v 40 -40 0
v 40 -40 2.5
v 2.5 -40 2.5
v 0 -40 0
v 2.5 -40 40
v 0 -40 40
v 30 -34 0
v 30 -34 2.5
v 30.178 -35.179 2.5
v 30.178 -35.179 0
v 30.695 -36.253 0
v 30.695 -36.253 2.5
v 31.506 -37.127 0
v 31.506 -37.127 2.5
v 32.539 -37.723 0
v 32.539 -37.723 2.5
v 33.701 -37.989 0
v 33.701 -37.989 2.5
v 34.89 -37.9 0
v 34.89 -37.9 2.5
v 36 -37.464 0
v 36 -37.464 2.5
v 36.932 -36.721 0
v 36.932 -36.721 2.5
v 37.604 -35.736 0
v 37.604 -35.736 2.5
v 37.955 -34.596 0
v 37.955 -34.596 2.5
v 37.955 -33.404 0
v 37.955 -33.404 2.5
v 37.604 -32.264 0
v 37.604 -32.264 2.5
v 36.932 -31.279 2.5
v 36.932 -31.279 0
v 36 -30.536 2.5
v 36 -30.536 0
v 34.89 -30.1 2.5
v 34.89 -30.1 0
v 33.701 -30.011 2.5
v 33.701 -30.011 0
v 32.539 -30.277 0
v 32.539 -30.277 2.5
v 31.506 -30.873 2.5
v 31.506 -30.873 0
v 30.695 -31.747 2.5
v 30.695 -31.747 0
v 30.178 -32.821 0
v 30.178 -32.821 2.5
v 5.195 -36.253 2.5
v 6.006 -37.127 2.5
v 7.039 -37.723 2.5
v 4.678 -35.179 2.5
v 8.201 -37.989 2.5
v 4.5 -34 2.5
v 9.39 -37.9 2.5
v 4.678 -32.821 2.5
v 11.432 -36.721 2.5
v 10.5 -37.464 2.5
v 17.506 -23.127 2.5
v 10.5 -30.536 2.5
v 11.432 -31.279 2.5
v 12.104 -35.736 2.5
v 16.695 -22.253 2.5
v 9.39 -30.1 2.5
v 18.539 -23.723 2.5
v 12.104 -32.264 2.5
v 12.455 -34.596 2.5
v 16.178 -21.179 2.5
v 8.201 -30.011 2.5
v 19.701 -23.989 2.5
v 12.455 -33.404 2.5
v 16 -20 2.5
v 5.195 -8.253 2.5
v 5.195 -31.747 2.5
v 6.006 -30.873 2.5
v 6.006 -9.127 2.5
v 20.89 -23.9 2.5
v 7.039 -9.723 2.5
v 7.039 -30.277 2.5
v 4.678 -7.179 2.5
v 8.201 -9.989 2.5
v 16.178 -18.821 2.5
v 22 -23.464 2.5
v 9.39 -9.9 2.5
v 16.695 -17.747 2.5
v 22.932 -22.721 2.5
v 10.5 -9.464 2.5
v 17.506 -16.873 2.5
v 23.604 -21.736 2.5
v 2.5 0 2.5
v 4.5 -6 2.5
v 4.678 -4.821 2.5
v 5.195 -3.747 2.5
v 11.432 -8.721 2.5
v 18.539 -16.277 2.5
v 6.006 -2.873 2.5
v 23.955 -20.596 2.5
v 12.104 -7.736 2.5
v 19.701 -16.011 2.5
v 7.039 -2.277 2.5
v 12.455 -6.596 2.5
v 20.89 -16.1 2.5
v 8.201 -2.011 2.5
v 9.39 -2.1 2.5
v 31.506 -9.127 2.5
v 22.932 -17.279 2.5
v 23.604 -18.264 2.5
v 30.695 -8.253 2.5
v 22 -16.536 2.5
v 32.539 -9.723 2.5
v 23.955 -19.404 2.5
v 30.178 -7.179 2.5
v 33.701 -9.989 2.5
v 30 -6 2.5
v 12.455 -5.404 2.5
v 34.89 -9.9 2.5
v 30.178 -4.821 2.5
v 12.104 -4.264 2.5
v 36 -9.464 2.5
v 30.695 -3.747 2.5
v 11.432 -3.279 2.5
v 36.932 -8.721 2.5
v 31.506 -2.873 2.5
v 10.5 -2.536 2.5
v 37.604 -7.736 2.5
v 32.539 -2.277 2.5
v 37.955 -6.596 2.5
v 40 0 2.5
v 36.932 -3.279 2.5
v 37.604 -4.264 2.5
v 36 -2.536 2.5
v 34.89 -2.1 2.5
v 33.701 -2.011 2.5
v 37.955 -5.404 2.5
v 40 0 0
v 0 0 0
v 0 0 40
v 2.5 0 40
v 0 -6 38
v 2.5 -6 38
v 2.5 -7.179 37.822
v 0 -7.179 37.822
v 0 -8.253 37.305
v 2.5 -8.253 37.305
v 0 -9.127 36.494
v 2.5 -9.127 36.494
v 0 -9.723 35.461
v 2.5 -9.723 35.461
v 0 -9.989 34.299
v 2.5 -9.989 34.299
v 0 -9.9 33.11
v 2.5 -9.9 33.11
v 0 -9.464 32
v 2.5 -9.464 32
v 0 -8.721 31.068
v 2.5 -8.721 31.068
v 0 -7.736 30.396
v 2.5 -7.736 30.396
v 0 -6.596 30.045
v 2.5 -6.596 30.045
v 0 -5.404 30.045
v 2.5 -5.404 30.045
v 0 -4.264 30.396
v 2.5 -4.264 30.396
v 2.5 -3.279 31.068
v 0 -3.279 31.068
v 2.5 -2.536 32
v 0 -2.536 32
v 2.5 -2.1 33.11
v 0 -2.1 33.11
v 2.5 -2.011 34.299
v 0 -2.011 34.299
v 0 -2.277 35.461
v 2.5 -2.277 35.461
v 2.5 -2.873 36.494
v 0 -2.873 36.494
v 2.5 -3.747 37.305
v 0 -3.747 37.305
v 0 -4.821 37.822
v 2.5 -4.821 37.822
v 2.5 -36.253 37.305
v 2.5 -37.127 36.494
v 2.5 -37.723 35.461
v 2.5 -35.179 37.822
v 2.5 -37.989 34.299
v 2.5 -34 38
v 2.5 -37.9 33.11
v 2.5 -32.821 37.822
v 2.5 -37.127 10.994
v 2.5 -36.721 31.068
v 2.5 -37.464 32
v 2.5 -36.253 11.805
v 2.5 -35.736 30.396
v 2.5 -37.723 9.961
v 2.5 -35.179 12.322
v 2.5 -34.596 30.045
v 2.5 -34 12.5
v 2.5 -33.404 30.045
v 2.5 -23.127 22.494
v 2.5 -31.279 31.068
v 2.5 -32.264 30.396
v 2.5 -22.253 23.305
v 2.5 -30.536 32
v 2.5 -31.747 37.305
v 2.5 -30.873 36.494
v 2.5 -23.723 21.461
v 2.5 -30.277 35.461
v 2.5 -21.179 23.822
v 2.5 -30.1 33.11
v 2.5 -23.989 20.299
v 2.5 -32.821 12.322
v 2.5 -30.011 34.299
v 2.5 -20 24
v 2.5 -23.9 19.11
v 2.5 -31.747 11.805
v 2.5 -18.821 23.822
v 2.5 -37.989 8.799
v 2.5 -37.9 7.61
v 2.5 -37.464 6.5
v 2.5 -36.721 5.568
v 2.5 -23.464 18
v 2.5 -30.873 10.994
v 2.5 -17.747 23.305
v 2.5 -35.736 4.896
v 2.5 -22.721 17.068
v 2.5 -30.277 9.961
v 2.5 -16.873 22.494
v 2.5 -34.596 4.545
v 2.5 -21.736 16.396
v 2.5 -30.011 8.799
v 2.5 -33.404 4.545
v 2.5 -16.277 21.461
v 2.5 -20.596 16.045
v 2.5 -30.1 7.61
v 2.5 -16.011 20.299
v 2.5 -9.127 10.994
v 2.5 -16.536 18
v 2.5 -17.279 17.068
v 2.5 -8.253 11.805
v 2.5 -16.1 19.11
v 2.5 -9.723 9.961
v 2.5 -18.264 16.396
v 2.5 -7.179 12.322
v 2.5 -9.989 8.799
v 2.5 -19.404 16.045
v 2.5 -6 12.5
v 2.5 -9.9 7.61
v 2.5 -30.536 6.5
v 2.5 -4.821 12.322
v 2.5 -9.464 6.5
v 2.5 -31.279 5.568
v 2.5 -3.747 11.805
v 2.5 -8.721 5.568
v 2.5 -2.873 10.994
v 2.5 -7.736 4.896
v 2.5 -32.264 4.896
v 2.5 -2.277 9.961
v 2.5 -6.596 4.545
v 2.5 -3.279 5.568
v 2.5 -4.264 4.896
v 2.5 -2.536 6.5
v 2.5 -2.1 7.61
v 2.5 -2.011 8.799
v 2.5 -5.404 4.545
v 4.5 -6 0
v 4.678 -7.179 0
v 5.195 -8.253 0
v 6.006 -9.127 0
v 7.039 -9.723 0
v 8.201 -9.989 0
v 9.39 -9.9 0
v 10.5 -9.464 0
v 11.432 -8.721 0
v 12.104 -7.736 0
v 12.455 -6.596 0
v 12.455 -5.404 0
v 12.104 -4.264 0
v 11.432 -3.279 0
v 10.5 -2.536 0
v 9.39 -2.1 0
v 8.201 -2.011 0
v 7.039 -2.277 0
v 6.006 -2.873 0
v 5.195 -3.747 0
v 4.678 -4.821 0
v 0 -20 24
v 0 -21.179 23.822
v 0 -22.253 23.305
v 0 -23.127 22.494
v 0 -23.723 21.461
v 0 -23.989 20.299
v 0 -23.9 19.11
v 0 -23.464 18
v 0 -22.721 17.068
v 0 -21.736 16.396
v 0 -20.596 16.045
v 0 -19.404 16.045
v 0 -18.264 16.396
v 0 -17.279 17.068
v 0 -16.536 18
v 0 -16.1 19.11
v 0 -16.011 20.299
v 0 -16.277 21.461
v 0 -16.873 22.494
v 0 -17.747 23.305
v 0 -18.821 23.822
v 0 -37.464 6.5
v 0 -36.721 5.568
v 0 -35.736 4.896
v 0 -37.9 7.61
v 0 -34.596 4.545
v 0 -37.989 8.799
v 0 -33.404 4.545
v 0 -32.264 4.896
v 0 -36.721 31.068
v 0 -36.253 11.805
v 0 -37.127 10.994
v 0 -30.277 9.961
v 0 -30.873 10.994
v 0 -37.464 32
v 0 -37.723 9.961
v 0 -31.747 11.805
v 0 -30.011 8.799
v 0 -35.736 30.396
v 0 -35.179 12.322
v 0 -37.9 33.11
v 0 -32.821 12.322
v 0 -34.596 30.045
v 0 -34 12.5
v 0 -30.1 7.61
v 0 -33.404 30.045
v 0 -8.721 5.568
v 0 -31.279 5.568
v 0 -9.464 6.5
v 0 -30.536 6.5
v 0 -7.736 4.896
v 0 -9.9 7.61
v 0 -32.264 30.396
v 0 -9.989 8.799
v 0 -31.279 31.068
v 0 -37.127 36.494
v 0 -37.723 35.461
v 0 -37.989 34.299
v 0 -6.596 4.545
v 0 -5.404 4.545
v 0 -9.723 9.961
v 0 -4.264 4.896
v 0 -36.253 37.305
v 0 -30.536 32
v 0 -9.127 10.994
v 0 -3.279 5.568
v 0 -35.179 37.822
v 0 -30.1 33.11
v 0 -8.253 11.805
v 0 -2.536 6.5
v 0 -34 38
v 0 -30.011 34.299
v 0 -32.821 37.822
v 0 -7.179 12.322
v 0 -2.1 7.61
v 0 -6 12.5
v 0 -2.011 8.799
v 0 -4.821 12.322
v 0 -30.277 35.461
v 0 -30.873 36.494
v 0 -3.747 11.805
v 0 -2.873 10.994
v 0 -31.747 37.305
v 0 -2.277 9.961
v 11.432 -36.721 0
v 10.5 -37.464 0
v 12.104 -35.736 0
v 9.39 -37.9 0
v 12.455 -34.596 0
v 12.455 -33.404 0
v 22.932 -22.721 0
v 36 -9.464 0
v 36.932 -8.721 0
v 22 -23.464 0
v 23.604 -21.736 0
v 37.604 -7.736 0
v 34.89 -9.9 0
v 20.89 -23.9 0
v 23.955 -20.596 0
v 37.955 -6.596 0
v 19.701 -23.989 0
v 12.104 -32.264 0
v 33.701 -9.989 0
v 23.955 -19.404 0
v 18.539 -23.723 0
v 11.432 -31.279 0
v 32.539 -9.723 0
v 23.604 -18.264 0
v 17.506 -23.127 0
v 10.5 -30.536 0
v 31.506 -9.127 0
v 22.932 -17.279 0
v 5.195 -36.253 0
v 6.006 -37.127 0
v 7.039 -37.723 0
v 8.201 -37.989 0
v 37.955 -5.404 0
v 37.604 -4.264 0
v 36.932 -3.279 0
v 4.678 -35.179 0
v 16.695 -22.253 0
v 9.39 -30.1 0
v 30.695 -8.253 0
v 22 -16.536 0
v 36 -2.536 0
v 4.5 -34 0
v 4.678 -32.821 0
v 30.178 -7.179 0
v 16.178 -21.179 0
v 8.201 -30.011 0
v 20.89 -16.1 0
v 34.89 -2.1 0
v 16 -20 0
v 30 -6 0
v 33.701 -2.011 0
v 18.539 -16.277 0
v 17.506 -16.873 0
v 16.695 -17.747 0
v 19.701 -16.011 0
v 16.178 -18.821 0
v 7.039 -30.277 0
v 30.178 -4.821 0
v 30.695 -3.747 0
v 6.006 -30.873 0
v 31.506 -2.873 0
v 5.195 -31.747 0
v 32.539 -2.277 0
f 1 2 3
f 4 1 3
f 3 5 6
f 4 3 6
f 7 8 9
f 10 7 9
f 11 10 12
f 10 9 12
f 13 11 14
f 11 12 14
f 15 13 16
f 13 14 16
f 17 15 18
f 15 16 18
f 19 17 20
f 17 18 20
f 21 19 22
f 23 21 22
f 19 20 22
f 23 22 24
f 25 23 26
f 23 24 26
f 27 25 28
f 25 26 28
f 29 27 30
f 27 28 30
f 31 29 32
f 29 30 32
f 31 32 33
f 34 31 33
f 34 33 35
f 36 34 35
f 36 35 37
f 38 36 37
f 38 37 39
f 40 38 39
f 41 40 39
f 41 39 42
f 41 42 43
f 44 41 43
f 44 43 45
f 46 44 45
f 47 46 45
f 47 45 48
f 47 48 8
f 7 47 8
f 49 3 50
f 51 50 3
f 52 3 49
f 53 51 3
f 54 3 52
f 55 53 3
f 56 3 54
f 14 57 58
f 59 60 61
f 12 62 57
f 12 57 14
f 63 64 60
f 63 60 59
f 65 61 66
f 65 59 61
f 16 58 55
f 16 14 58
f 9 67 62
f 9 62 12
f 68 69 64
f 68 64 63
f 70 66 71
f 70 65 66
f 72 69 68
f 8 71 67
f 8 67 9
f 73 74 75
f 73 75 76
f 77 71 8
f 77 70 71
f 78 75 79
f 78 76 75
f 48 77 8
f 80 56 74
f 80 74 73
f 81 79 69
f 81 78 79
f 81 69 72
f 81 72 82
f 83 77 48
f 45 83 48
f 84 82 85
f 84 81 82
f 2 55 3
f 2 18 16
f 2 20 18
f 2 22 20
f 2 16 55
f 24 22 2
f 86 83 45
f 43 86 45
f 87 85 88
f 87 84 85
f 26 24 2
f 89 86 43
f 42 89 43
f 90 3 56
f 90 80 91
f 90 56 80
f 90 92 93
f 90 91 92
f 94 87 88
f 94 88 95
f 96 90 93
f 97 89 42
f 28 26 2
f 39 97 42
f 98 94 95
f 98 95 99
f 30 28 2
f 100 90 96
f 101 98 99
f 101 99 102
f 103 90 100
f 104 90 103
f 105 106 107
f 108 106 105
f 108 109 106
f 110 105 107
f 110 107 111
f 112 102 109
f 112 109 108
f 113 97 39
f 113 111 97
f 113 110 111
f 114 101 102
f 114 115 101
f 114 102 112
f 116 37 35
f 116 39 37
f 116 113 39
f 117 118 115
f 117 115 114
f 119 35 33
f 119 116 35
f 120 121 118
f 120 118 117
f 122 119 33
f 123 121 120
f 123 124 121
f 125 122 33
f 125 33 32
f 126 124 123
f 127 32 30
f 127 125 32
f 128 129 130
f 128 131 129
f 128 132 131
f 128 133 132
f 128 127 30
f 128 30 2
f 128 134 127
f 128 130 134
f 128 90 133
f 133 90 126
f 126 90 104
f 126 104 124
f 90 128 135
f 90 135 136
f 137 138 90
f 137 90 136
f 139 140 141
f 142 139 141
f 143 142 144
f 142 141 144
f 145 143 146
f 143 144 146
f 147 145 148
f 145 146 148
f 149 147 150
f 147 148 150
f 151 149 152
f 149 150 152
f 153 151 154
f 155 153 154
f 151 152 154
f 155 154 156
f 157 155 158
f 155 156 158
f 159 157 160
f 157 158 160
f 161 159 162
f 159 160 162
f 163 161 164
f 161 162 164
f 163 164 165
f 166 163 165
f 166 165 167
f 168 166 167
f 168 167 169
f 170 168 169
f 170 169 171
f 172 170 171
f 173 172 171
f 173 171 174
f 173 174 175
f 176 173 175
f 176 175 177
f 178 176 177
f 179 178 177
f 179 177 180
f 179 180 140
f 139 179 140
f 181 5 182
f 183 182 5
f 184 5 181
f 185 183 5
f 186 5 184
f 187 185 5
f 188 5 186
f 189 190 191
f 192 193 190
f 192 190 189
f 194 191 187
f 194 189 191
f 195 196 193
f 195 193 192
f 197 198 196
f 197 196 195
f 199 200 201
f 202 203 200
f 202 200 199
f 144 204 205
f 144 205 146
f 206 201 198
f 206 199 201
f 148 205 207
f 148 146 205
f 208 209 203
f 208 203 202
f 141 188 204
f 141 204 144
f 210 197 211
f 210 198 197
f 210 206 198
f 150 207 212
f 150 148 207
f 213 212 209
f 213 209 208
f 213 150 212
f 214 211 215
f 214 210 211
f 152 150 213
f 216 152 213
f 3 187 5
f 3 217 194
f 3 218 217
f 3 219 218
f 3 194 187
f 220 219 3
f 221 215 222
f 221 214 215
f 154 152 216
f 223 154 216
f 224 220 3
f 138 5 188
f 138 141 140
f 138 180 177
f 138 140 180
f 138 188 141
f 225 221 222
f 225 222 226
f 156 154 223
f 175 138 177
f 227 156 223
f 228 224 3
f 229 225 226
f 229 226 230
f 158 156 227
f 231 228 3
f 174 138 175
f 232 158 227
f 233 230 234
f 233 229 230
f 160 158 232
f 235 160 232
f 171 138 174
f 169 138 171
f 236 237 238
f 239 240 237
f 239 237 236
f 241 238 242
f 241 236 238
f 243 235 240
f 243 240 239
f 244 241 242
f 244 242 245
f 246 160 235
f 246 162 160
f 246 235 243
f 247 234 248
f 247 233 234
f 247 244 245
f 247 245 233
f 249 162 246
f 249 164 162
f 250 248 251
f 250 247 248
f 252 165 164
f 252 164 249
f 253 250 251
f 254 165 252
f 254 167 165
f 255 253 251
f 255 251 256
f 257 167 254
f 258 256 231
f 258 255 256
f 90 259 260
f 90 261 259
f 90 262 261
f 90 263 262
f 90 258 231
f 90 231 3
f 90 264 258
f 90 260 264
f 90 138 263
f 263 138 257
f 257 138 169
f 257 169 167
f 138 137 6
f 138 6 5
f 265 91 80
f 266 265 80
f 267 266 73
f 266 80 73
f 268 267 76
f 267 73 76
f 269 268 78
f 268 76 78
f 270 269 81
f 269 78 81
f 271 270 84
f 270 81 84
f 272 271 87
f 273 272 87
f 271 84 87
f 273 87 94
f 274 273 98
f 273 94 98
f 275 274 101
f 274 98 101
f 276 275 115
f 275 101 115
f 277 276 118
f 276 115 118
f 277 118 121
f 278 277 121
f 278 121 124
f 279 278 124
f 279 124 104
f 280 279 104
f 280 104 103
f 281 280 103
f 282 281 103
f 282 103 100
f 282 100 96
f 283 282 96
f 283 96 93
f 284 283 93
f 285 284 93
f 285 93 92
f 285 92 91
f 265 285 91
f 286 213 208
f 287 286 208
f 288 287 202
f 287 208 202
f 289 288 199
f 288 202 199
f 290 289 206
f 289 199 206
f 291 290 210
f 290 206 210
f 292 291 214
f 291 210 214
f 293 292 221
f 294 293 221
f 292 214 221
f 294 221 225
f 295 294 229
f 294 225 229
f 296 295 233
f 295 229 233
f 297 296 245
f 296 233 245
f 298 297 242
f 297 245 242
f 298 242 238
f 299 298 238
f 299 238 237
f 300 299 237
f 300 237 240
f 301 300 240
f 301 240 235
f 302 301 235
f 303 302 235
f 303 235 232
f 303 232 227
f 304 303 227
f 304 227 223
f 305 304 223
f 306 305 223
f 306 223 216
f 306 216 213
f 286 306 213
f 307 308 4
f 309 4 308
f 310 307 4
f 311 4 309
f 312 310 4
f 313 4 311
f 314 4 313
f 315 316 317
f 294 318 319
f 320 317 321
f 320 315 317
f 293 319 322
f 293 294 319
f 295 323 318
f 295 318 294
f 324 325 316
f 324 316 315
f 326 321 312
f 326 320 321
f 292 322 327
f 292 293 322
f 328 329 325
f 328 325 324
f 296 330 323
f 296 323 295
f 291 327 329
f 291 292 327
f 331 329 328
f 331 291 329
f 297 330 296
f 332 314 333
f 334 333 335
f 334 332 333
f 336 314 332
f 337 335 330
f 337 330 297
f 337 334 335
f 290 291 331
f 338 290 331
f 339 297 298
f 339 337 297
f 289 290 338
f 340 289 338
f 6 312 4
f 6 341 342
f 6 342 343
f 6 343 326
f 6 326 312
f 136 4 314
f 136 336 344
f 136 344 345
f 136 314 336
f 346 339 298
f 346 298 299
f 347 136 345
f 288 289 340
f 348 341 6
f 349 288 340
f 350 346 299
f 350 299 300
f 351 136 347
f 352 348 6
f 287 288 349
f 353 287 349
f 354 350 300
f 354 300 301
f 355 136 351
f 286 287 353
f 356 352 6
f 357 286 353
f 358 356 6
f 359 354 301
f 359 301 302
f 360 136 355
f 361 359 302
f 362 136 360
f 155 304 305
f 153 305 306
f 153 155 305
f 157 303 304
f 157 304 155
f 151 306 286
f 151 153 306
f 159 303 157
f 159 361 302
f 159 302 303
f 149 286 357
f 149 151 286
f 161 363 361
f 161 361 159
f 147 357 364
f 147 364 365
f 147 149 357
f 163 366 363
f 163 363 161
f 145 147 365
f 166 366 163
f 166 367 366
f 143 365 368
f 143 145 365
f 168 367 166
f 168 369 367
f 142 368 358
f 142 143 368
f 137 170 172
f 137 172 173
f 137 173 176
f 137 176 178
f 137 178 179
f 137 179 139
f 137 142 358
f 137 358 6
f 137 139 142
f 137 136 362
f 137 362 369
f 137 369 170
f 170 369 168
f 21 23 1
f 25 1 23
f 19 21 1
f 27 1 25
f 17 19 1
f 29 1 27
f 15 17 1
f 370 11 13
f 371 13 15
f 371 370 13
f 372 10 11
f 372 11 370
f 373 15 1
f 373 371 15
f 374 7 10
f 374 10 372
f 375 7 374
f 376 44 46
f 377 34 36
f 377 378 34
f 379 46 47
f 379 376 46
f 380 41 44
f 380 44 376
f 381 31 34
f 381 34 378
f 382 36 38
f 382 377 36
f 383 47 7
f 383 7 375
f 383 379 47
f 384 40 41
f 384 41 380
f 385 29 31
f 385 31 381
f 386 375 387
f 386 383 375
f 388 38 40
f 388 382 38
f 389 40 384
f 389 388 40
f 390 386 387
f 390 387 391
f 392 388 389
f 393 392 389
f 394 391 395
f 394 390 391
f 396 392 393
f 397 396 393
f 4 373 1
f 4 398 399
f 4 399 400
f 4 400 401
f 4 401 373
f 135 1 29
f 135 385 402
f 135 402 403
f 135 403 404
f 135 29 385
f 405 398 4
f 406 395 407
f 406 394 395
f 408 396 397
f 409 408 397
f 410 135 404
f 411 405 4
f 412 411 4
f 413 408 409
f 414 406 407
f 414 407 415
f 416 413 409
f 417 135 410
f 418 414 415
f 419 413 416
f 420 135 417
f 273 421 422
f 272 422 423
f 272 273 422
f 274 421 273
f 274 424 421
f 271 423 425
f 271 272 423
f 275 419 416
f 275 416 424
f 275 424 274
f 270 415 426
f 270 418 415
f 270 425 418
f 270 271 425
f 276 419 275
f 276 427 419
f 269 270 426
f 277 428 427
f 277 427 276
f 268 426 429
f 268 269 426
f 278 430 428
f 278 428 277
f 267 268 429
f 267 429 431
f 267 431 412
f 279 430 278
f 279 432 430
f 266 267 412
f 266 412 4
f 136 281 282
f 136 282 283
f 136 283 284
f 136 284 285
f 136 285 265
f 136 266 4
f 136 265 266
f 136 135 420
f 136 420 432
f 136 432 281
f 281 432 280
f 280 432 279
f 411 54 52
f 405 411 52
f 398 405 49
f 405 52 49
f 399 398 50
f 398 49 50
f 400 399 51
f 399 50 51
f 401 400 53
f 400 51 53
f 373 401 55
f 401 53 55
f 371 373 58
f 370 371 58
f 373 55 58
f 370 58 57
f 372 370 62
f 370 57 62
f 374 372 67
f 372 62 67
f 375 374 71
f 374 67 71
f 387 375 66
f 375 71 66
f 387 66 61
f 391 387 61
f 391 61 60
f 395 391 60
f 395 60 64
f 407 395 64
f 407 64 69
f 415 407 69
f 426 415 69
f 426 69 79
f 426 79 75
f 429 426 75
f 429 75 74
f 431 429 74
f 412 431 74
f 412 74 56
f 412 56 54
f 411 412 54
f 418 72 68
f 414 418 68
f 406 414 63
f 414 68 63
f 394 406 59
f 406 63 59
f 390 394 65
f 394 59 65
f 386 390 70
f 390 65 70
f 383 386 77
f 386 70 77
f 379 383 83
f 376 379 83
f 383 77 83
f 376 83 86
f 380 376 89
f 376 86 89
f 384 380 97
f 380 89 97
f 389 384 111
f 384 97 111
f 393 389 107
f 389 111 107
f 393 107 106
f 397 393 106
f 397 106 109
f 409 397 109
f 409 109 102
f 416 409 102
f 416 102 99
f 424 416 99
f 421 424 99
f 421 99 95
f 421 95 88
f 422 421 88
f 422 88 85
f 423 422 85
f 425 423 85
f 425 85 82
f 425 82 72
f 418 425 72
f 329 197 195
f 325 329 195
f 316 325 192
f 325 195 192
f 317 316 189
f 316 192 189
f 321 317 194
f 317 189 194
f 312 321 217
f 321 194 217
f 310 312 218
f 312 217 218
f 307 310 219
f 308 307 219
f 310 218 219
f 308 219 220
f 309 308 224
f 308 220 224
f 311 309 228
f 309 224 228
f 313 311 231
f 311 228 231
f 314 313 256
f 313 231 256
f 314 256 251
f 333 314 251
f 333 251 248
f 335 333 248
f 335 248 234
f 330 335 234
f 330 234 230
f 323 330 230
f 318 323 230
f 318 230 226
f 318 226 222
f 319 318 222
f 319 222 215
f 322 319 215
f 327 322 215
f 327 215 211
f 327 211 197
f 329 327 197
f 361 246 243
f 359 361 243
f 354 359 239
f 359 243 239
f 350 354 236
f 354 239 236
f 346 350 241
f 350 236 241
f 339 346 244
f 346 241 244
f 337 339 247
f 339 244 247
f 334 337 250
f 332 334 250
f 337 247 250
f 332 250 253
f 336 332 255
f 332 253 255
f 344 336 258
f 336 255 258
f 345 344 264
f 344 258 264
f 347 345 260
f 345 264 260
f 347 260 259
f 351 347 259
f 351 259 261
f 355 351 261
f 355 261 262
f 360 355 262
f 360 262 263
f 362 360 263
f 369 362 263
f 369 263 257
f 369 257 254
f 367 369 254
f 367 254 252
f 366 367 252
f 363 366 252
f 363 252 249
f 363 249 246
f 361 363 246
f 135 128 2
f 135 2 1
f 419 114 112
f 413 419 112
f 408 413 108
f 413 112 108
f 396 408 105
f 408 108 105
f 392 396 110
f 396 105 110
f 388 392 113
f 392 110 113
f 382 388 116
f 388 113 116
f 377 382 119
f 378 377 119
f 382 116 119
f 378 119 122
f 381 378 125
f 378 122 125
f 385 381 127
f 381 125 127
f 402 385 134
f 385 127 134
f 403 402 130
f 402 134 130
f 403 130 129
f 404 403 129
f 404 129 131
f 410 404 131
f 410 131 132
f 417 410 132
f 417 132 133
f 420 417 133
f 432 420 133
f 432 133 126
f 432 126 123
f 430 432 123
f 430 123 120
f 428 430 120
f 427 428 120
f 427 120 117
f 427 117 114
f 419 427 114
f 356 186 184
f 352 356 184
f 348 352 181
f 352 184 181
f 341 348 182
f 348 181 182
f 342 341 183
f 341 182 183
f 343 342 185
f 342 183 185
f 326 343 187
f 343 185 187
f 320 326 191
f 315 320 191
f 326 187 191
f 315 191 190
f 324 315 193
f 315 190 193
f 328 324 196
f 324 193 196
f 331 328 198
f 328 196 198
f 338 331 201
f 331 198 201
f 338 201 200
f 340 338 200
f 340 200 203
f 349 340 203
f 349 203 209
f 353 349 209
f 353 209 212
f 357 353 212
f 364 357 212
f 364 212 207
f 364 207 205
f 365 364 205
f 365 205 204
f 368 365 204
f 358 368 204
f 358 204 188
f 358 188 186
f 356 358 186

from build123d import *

# Parameters (mm, degrees)
PAD_DEPTH       = 40
SKETCH001_R     = 4
POCKET_DEPTH    = 2.501
SKETCH002_R     = 4
POCKET001_DEPTH = 2.501


with BuildPart() as part:
    # Sketch → Pad (new body)
    with BuildSketch(Plane.XZ):
        Polygon((0, 0), (0, 40), (2.5, 40), (2.5, 2.5), (40, 2.5), (40, 0), align=None)
    extrude(amount=PAD_DEPTH)

    # Sketch001 (on Face3 of Pad) → Pocket (cut, through all)
    with BuildSketch(Plane(origin=(2.5, 0, 0), x_dir=(0, 0, 1), z_dir=(1, 0, 0))):
        with Locations((8.5, 34)):
            Circle(SKETCH001_R)
        with Locations((34, 34)):
            Circle(SKETCH001_R)
        with Locations((8.5, 6)):
            Circle(SKETCH001_R)
        with Locations((34, 6)):
            Circle(SKETCH001_R)
        with Locations((20, 20)):
            Circle(SKETCH001_R)
    extrude(amount=-POCKET_DEPTH, mode=Mode.SUBTRACT)

    # Sketch002 (on Face13 of Pocket) → Pocket001 (cut, through all)
    with BuildSketch(Plane(origin=(0, 0, 2.5), x_dir=(-1, 0, 0), z_dir=(0, 0, 1))):
        with Locations((-8.5, 6)):
            Circle(SKETCH002_R)
        with Locations((-34, 6)):
            Circle(SKETCH002_R)
        with Locations((-8.5, 34)):
            Circle(SKETCH002_R)
        with Locations((-34, 34)):
            Circle(SKETCH002_R)
        with Locations((-20, 20)):
            Circle(SKETCH002_R)
    extrude(amount=-POCKET001_DEPTH, mode=Mode.SUBTRACT)


solid = part.part
